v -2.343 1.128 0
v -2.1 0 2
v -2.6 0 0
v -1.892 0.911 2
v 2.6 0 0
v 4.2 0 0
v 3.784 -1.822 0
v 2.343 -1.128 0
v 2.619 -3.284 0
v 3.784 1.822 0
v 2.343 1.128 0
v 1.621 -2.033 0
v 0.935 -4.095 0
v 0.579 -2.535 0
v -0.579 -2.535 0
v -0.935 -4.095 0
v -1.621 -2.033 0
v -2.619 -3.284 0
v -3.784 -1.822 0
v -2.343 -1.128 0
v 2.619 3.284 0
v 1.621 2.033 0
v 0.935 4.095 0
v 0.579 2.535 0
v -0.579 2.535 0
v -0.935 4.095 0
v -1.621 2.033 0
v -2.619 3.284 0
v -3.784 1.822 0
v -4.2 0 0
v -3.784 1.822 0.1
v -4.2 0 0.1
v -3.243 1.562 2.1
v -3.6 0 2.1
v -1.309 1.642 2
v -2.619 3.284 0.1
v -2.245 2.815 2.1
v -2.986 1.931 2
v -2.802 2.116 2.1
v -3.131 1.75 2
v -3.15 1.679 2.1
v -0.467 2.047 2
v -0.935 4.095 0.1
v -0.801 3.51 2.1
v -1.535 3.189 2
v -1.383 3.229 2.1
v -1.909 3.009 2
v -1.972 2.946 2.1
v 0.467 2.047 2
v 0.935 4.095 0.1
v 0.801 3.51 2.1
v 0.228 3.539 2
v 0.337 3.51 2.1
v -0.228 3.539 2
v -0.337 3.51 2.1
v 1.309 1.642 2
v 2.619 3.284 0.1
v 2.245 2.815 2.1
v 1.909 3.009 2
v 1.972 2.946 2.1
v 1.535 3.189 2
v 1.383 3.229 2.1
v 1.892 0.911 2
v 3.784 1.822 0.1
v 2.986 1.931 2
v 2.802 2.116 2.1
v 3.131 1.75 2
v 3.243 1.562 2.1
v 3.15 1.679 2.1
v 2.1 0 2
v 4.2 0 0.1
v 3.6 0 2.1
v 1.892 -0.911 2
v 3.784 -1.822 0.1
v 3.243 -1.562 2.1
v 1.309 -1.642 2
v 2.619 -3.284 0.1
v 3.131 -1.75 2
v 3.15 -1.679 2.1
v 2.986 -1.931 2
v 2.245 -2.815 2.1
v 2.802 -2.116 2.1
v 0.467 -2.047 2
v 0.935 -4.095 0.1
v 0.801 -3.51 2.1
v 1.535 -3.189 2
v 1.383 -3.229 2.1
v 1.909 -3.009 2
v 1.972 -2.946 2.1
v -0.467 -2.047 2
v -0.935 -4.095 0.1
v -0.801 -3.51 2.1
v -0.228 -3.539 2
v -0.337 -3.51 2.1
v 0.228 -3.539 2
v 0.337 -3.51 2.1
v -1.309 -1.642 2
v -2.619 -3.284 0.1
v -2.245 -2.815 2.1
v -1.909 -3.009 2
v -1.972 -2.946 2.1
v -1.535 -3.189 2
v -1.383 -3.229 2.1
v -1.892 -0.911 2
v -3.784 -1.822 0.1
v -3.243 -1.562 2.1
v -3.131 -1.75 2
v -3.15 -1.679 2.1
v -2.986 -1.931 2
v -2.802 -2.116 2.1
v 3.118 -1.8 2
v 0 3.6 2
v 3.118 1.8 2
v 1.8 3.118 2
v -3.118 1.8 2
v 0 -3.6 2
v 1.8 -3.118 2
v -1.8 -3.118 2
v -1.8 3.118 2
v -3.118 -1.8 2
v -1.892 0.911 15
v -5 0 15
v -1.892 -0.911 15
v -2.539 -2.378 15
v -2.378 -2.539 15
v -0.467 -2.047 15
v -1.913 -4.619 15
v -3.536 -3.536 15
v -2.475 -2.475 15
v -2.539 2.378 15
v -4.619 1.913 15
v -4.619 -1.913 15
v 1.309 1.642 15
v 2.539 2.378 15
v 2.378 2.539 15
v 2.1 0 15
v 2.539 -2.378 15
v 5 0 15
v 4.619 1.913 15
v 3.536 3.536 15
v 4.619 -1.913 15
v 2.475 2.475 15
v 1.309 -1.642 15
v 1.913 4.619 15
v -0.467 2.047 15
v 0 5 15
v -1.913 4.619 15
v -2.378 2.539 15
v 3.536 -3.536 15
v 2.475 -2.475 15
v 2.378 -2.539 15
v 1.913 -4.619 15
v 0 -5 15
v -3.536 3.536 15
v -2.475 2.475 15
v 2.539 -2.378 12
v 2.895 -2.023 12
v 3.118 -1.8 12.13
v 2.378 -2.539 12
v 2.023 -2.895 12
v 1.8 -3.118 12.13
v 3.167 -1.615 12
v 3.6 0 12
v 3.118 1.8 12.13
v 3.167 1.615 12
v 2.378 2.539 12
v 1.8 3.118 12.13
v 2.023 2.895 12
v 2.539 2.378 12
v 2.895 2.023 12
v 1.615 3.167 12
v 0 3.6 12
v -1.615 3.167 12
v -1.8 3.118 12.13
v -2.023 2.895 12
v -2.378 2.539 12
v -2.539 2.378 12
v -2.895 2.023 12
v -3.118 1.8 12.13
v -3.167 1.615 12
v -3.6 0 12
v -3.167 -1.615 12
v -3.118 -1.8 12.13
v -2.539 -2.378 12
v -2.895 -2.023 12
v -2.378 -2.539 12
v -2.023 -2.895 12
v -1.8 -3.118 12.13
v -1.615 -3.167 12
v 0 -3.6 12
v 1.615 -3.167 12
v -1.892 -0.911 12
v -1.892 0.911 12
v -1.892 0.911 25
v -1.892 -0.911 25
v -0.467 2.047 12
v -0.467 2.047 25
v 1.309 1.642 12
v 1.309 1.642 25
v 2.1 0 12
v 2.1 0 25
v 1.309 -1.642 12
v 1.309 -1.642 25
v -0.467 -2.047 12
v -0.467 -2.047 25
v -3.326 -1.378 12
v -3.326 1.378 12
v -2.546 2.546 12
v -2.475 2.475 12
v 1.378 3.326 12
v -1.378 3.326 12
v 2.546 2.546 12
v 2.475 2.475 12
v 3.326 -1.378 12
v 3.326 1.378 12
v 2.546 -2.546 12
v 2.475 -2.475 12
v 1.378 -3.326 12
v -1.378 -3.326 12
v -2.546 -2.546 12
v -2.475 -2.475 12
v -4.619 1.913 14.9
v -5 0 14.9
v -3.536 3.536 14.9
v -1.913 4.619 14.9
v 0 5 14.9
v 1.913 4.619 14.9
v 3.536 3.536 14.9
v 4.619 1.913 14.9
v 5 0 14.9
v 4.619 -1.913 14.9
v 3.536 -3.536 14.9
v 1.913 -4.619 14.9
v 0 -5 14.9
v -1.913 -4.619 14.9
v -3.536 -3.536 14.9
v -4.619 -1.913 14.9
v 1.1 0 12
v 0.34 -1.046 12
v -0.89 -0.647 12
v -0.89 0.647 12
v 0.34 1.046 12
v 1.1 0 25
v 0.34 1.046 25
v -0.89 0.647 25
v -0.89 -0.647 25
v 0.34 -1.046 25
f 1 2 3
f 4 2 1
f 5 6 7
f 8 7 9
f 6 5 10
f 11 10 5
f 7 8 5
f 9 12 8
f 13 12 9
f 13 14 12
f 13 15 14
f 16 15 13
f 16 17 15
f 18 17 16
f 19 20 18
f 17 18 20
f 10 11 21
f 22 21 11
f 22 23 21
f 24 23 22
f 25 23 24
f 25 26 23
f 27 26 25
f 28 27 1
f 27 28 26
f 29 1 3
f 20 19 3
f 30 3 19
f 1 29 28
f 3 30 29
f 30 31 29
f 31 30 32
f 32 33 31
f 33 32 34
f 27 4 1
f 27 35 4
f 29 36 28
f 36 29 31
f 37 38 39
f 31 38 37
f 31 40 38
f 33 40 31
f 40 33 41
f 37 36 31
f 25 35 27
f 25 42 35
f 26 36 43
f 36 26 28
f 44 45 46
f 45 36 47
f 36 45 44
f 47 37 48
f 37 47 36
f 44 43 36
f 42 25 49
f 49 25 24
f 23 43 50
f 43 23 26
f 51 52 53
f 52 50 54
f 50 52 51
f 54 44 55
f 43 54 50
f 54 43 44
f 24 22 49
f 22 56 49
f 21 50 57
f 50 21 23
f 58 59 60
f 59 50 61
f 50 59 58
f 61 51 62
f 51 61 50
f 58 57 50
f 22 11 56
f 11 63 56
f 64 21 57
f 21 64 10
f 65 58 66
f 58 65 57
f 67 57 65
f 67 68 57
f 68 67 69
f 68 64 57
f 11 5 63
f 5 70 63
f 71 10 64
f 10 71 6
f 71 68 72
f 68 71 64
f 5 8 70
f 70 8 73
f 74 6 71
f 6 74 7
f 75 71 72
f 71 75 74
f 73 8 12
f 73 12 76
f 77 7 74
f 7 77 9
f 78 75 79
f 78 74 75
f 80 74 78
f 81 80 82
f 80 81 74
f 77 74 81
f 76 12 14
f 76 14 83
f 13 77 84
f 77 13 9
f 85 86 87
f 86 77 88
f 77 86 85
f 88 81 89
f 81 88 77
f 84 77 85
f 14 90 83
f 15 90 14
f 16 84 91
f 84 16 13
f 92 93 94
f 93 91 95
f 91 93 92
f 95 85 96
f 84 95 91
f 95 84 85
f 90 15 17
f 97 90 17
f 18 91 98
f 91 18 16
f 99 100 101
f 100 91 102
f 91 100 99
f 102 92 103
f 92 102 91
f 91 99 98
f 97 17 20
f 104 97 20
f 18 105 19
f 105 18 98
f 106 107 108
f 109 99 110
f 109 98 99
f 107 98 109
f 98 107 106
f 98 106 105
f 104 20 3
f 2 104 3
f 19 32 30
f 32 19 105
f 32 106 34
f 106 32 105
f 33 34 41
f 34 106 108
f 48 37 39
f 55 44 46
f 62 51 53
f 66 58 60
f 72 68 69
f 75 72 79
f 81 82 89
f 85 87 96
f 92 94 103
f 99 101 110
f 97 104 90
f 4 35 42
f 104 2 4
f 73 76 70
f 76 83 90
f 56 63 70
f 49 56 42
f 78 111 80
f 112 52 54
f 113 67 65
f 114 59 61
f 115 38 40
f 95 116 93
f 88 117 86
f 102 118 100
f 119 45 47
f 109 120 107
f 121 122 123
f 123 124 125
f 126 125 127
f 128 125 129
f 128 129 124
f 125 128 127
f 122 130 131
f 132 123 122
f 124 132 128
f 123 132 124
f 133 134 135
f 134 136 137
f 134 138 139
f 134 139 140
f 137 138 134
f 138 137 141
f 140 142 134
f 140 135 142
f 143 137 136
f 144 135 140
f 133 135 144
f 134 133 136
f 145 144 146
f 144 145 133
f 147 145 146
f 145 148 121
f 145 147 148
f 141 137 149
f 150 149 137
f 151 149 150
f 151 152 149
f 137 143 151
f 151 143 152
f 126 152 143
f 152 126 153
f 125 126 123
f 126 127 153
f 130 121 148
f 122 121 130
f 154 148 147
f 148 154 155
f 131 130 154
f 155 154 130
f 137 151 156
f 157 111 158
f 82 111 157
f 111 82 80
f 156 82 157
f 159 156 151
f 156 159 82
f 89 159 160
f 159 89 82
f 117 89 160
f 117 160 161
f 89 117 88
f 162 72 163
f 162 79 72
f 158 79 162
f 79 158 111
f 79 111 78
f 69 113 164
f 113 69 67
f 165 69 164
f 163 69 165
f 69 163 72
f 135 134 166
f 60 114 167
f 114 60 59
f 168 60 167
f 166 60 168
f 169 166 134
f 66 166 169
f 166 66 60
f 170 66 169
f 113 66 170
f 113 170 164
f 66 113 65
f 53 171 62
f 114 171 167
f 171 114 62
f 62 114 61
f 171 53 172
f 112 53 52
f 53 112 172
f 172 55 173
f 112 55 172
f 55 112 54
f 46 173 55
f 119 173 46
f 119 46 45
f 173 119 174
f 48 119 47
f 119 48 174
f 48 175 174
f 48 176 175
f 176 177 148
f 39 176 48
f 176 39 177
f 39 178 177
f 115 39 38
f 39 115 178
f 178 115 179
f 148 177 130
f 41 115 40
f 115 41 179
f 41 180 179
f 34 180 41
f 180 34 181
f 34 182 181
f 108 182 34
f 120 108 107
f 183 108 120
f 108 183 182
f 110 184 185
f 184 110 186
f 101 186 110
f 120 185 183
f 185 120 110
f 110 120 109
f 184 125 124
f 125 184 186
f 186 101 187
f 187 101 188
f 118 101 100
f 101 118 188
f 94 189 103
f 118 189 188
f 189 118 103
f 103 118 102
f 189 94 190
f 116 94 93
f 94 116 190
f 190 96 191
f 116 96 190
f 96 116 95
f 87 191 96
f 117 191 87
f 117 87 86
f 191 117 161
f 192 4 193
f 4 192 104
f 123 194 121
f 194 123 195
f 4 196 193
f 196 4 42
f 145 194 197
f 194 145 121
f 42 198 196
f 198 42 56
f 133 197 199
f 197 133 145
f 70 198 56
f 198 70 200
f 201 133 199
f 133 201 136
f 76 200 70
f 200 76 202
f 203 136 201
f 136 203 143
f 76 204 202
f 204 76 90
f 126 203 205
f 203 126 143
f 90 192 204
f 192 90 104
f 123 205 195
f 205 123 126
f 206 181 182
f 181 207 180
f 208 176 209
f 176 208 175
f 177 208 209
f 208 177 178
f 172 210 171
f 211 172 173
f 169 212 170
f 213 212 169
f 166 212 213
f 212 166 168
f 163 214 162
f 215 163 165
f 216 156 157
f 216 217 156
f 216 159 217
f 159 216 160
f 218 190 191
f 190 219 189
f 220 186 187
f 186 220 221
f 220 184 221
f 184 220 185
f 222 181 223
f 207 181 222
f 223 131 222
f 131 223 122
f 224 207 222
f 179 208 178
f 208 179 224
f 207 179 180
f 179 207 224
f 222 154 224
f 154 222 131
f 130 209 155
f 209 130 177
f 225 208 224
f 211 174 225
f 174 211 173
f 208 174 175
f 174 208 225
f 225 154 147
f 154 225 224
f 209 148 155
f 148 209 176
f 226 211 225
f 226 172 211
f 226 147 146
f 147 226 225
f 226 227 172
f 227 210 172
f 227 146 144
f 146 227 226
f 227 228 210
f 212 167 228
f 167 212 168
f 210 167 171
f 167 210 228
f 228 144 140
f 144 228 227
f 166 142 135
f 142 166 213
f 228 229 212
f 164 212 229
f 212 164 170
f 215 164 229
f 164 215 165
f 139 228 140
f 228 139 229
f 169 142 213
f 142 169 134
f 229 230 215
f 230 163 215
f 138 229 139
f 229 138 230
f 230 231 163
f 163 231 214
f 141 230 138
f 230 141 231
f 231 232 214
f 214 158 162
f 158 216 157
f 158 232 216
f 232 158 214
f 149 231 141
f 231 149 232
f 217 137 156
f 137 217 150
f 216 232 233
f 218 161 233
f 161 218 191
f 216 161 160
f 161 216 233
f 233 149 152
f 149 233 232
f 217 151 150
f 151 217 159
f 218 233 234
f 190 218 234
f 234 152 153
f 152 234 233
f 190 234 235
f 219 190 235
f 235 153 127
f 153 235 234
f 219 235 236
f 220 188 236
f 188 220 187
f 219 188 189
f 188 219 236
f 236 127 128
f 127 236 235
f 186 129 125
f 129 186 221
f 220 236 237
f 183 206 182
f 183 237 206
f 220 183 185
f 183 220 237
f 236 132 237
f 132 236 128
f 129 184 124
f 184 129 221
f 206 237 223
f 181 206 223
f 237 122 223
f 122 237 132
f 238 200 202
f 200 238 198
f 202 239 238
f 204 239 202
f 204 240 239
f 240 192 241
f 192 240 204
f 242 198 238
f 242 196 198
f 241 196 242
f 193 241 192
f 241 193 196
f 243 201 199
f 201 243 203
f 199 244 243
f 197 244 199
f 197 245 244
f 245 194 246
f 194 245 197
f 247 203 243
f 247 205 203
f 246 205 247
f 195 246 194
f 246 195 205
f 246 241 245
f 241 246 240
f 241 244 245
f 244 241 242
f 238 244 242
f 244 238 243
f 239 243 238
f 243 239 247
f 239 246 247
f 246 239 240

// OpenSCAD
// Useful with Creality Space PI, which does not stop the PTFE tube from sliding into the filament compartment.
// Print it with 0.2 nozzle and 0.06 high quality for best results. Enable brim for better adhesion.
// Printing horizontally might improve the strength of the part.

// default values, override them as needed. Values are in millimeters
function ptfe_stopper_tube_outer_diameter() = 4.0;
function ptfe_stopper_tube_inner_diameter() = 2.0;
function ptfe_stopper_sleeve_outer_diameter() = 7.0;
function ptfe_stopper_sleeve_length() = 10.0;
function pfte_stopper_insert_length() = 10.0;
function pfte_stopper_sleeve_insert_overlap() = 3.0; // provide some strenght to the joint
function pfte_stopper_sleeve_skirt_length() = 2.0;
function pfte_stopper_sleeve_skirt_inner_diameter() = ptfe_stopper_tube_outer_diameter() + 1;
function pfte_stopper_sleeve_skirt_outer_diameter() = ptfe_stopper_sleeve_outer_diameter() + 1;

function pfte_stopper_washer_plate_outer_diameter() = 10.0;
function pfte_stopper_washer_plate_skirt_h() = 3.0;

function ptfe_stopper_sleeve_loose_tolerance() = 0.2;
function ptfe_stopper_filament_loose_tolerance() = 0.2;

module ptfe_stopper_sleeve(
    tube_outer_d = ptfe_stopper_tube_outer_diameter(),
    tube_inner_d = ptfe_stopper_tube_inner_diameter(),
    skirt_inner_d = pfte_stopper_sleeve_skirt_inner_diameter(),
    skirt_outer_d = pfte_stopper_sleeve_skirt_outer_diameter(),
    skirt_h = pfte_stopper_sleeve_skirt_length(),
    sleeve_outer_d = ptfe_stopper_sleeve_outer_diameter(),
    sleeve_h = ptfe_stopper_sleeve_length(),
    insert_h = pfte_stopper_insert_length(),
    overlap = pfte_stopper_sleeve_insert_overlap(),
    sleeve_tolerance = ptfe_stopper_sleeve_loose_tolerance(),
    filament_tolerance = ptfe_stopper_filament_loose_tolerance(),
    washer_plate_outer_d = pfte_stopper_washer_plate_outer_diameter(),
    washer_plate_skirt_h = pfte_stopper_washer_plate_skirt_h(),
) {
    sleeve_offset_z = skirt_h;
    overlap_offset_z = sleeve_offset_z + sleeve_h;
    washer_plate_offset_z = overlap_offset_z + overlap - washer_plate_skirt_h;

    sleeve_outer_d = sleeve_outer_d + ptfe_stopper_sleeve_loose_tolerance();
    sleeve_inner_d = tube_outer_d + ptfe_stopper_sleeve_loose_tolerance();
    sleeve_h = sleeve_h + overlap;

    sleeve_outer_r = sleeve_outer_d / 2;
    sleeve_inner_r = sleeve_inner_d / 2;

    skirt_inner_d = skirt_inner_d + ptfe_stopper_sleeve_loose_tolerance();
    skirt_outer_d = skirt_outer_d + ptfe_stopper_sleeve_loose_tolerance();

    skirt_inner_r = skirt_inner_d / 2;
    skirt_outer_r = skirt_outer_d / 2;

    union() {
        // sleeve skirt - ease PTFE tube insertion
        rotate_extrude() {
            hull() {
                square_w = 0.1;
                sleeve_outer_r = sleeve_outer_r - square_w;
                translate([skirt_inner_r, 0]) square(square_w);
                translate([sleeve_inner_r, skirt_h]) square(square_w);
                translate([sleeve_outer_r, skirt_h]) square(square_w);
                translate([skirt_outer_r, 0]) square(square_w);
            }
        }

        // sleeve
        translate([0, 0, sleeve_offset_z])
        linear_extrude(height = sleeve_h) {
            difference() {
                circle(d = sleeve_outer_d);
                circle(d = sleeve_inner_d);
            }
        }

        washer_plate_outer_r = washer_plate_outer_d / 2;
        // washer_plate
        translate([0, 0, washer_plate_offset_z])
        rotate_extrude() {
            hull() {
                square_w = 0.1;
                sleeve_outer_r = sleeve_outer_r - square_w;
                washer_plate_outer_r = washer_plate_outer_r - square_w;
                washer_plate_skirt_h = washer_plate_skirt_h - square_w;
                translate([sleeve_outer_r, 0]) square(square_w);
                translate([washer_plate_outer_r, washer_plate_skirt_h]) square(square_w);
                translate([sleeve_outer_r, washer_plate_skirt_h]) square(square_w);
            }
        }

        insert_h = insert_h + overlap;
        insert_offset_z = overlap_offset_z;

        tube_inner_d = tube_inner_d + filament_tolerance;
        tube_outer_d = tube_outer_d + filament_tolerance;

        // insert
        translate([0, 0, insert_offset_z])
        linear_extrude(height = insert_h) {
            difference() {
                circle(d = tube_outer_d);
                circle(d = tube_inner_d);
            }
        }
    }
}

ptfe_stopper_sleeve();
